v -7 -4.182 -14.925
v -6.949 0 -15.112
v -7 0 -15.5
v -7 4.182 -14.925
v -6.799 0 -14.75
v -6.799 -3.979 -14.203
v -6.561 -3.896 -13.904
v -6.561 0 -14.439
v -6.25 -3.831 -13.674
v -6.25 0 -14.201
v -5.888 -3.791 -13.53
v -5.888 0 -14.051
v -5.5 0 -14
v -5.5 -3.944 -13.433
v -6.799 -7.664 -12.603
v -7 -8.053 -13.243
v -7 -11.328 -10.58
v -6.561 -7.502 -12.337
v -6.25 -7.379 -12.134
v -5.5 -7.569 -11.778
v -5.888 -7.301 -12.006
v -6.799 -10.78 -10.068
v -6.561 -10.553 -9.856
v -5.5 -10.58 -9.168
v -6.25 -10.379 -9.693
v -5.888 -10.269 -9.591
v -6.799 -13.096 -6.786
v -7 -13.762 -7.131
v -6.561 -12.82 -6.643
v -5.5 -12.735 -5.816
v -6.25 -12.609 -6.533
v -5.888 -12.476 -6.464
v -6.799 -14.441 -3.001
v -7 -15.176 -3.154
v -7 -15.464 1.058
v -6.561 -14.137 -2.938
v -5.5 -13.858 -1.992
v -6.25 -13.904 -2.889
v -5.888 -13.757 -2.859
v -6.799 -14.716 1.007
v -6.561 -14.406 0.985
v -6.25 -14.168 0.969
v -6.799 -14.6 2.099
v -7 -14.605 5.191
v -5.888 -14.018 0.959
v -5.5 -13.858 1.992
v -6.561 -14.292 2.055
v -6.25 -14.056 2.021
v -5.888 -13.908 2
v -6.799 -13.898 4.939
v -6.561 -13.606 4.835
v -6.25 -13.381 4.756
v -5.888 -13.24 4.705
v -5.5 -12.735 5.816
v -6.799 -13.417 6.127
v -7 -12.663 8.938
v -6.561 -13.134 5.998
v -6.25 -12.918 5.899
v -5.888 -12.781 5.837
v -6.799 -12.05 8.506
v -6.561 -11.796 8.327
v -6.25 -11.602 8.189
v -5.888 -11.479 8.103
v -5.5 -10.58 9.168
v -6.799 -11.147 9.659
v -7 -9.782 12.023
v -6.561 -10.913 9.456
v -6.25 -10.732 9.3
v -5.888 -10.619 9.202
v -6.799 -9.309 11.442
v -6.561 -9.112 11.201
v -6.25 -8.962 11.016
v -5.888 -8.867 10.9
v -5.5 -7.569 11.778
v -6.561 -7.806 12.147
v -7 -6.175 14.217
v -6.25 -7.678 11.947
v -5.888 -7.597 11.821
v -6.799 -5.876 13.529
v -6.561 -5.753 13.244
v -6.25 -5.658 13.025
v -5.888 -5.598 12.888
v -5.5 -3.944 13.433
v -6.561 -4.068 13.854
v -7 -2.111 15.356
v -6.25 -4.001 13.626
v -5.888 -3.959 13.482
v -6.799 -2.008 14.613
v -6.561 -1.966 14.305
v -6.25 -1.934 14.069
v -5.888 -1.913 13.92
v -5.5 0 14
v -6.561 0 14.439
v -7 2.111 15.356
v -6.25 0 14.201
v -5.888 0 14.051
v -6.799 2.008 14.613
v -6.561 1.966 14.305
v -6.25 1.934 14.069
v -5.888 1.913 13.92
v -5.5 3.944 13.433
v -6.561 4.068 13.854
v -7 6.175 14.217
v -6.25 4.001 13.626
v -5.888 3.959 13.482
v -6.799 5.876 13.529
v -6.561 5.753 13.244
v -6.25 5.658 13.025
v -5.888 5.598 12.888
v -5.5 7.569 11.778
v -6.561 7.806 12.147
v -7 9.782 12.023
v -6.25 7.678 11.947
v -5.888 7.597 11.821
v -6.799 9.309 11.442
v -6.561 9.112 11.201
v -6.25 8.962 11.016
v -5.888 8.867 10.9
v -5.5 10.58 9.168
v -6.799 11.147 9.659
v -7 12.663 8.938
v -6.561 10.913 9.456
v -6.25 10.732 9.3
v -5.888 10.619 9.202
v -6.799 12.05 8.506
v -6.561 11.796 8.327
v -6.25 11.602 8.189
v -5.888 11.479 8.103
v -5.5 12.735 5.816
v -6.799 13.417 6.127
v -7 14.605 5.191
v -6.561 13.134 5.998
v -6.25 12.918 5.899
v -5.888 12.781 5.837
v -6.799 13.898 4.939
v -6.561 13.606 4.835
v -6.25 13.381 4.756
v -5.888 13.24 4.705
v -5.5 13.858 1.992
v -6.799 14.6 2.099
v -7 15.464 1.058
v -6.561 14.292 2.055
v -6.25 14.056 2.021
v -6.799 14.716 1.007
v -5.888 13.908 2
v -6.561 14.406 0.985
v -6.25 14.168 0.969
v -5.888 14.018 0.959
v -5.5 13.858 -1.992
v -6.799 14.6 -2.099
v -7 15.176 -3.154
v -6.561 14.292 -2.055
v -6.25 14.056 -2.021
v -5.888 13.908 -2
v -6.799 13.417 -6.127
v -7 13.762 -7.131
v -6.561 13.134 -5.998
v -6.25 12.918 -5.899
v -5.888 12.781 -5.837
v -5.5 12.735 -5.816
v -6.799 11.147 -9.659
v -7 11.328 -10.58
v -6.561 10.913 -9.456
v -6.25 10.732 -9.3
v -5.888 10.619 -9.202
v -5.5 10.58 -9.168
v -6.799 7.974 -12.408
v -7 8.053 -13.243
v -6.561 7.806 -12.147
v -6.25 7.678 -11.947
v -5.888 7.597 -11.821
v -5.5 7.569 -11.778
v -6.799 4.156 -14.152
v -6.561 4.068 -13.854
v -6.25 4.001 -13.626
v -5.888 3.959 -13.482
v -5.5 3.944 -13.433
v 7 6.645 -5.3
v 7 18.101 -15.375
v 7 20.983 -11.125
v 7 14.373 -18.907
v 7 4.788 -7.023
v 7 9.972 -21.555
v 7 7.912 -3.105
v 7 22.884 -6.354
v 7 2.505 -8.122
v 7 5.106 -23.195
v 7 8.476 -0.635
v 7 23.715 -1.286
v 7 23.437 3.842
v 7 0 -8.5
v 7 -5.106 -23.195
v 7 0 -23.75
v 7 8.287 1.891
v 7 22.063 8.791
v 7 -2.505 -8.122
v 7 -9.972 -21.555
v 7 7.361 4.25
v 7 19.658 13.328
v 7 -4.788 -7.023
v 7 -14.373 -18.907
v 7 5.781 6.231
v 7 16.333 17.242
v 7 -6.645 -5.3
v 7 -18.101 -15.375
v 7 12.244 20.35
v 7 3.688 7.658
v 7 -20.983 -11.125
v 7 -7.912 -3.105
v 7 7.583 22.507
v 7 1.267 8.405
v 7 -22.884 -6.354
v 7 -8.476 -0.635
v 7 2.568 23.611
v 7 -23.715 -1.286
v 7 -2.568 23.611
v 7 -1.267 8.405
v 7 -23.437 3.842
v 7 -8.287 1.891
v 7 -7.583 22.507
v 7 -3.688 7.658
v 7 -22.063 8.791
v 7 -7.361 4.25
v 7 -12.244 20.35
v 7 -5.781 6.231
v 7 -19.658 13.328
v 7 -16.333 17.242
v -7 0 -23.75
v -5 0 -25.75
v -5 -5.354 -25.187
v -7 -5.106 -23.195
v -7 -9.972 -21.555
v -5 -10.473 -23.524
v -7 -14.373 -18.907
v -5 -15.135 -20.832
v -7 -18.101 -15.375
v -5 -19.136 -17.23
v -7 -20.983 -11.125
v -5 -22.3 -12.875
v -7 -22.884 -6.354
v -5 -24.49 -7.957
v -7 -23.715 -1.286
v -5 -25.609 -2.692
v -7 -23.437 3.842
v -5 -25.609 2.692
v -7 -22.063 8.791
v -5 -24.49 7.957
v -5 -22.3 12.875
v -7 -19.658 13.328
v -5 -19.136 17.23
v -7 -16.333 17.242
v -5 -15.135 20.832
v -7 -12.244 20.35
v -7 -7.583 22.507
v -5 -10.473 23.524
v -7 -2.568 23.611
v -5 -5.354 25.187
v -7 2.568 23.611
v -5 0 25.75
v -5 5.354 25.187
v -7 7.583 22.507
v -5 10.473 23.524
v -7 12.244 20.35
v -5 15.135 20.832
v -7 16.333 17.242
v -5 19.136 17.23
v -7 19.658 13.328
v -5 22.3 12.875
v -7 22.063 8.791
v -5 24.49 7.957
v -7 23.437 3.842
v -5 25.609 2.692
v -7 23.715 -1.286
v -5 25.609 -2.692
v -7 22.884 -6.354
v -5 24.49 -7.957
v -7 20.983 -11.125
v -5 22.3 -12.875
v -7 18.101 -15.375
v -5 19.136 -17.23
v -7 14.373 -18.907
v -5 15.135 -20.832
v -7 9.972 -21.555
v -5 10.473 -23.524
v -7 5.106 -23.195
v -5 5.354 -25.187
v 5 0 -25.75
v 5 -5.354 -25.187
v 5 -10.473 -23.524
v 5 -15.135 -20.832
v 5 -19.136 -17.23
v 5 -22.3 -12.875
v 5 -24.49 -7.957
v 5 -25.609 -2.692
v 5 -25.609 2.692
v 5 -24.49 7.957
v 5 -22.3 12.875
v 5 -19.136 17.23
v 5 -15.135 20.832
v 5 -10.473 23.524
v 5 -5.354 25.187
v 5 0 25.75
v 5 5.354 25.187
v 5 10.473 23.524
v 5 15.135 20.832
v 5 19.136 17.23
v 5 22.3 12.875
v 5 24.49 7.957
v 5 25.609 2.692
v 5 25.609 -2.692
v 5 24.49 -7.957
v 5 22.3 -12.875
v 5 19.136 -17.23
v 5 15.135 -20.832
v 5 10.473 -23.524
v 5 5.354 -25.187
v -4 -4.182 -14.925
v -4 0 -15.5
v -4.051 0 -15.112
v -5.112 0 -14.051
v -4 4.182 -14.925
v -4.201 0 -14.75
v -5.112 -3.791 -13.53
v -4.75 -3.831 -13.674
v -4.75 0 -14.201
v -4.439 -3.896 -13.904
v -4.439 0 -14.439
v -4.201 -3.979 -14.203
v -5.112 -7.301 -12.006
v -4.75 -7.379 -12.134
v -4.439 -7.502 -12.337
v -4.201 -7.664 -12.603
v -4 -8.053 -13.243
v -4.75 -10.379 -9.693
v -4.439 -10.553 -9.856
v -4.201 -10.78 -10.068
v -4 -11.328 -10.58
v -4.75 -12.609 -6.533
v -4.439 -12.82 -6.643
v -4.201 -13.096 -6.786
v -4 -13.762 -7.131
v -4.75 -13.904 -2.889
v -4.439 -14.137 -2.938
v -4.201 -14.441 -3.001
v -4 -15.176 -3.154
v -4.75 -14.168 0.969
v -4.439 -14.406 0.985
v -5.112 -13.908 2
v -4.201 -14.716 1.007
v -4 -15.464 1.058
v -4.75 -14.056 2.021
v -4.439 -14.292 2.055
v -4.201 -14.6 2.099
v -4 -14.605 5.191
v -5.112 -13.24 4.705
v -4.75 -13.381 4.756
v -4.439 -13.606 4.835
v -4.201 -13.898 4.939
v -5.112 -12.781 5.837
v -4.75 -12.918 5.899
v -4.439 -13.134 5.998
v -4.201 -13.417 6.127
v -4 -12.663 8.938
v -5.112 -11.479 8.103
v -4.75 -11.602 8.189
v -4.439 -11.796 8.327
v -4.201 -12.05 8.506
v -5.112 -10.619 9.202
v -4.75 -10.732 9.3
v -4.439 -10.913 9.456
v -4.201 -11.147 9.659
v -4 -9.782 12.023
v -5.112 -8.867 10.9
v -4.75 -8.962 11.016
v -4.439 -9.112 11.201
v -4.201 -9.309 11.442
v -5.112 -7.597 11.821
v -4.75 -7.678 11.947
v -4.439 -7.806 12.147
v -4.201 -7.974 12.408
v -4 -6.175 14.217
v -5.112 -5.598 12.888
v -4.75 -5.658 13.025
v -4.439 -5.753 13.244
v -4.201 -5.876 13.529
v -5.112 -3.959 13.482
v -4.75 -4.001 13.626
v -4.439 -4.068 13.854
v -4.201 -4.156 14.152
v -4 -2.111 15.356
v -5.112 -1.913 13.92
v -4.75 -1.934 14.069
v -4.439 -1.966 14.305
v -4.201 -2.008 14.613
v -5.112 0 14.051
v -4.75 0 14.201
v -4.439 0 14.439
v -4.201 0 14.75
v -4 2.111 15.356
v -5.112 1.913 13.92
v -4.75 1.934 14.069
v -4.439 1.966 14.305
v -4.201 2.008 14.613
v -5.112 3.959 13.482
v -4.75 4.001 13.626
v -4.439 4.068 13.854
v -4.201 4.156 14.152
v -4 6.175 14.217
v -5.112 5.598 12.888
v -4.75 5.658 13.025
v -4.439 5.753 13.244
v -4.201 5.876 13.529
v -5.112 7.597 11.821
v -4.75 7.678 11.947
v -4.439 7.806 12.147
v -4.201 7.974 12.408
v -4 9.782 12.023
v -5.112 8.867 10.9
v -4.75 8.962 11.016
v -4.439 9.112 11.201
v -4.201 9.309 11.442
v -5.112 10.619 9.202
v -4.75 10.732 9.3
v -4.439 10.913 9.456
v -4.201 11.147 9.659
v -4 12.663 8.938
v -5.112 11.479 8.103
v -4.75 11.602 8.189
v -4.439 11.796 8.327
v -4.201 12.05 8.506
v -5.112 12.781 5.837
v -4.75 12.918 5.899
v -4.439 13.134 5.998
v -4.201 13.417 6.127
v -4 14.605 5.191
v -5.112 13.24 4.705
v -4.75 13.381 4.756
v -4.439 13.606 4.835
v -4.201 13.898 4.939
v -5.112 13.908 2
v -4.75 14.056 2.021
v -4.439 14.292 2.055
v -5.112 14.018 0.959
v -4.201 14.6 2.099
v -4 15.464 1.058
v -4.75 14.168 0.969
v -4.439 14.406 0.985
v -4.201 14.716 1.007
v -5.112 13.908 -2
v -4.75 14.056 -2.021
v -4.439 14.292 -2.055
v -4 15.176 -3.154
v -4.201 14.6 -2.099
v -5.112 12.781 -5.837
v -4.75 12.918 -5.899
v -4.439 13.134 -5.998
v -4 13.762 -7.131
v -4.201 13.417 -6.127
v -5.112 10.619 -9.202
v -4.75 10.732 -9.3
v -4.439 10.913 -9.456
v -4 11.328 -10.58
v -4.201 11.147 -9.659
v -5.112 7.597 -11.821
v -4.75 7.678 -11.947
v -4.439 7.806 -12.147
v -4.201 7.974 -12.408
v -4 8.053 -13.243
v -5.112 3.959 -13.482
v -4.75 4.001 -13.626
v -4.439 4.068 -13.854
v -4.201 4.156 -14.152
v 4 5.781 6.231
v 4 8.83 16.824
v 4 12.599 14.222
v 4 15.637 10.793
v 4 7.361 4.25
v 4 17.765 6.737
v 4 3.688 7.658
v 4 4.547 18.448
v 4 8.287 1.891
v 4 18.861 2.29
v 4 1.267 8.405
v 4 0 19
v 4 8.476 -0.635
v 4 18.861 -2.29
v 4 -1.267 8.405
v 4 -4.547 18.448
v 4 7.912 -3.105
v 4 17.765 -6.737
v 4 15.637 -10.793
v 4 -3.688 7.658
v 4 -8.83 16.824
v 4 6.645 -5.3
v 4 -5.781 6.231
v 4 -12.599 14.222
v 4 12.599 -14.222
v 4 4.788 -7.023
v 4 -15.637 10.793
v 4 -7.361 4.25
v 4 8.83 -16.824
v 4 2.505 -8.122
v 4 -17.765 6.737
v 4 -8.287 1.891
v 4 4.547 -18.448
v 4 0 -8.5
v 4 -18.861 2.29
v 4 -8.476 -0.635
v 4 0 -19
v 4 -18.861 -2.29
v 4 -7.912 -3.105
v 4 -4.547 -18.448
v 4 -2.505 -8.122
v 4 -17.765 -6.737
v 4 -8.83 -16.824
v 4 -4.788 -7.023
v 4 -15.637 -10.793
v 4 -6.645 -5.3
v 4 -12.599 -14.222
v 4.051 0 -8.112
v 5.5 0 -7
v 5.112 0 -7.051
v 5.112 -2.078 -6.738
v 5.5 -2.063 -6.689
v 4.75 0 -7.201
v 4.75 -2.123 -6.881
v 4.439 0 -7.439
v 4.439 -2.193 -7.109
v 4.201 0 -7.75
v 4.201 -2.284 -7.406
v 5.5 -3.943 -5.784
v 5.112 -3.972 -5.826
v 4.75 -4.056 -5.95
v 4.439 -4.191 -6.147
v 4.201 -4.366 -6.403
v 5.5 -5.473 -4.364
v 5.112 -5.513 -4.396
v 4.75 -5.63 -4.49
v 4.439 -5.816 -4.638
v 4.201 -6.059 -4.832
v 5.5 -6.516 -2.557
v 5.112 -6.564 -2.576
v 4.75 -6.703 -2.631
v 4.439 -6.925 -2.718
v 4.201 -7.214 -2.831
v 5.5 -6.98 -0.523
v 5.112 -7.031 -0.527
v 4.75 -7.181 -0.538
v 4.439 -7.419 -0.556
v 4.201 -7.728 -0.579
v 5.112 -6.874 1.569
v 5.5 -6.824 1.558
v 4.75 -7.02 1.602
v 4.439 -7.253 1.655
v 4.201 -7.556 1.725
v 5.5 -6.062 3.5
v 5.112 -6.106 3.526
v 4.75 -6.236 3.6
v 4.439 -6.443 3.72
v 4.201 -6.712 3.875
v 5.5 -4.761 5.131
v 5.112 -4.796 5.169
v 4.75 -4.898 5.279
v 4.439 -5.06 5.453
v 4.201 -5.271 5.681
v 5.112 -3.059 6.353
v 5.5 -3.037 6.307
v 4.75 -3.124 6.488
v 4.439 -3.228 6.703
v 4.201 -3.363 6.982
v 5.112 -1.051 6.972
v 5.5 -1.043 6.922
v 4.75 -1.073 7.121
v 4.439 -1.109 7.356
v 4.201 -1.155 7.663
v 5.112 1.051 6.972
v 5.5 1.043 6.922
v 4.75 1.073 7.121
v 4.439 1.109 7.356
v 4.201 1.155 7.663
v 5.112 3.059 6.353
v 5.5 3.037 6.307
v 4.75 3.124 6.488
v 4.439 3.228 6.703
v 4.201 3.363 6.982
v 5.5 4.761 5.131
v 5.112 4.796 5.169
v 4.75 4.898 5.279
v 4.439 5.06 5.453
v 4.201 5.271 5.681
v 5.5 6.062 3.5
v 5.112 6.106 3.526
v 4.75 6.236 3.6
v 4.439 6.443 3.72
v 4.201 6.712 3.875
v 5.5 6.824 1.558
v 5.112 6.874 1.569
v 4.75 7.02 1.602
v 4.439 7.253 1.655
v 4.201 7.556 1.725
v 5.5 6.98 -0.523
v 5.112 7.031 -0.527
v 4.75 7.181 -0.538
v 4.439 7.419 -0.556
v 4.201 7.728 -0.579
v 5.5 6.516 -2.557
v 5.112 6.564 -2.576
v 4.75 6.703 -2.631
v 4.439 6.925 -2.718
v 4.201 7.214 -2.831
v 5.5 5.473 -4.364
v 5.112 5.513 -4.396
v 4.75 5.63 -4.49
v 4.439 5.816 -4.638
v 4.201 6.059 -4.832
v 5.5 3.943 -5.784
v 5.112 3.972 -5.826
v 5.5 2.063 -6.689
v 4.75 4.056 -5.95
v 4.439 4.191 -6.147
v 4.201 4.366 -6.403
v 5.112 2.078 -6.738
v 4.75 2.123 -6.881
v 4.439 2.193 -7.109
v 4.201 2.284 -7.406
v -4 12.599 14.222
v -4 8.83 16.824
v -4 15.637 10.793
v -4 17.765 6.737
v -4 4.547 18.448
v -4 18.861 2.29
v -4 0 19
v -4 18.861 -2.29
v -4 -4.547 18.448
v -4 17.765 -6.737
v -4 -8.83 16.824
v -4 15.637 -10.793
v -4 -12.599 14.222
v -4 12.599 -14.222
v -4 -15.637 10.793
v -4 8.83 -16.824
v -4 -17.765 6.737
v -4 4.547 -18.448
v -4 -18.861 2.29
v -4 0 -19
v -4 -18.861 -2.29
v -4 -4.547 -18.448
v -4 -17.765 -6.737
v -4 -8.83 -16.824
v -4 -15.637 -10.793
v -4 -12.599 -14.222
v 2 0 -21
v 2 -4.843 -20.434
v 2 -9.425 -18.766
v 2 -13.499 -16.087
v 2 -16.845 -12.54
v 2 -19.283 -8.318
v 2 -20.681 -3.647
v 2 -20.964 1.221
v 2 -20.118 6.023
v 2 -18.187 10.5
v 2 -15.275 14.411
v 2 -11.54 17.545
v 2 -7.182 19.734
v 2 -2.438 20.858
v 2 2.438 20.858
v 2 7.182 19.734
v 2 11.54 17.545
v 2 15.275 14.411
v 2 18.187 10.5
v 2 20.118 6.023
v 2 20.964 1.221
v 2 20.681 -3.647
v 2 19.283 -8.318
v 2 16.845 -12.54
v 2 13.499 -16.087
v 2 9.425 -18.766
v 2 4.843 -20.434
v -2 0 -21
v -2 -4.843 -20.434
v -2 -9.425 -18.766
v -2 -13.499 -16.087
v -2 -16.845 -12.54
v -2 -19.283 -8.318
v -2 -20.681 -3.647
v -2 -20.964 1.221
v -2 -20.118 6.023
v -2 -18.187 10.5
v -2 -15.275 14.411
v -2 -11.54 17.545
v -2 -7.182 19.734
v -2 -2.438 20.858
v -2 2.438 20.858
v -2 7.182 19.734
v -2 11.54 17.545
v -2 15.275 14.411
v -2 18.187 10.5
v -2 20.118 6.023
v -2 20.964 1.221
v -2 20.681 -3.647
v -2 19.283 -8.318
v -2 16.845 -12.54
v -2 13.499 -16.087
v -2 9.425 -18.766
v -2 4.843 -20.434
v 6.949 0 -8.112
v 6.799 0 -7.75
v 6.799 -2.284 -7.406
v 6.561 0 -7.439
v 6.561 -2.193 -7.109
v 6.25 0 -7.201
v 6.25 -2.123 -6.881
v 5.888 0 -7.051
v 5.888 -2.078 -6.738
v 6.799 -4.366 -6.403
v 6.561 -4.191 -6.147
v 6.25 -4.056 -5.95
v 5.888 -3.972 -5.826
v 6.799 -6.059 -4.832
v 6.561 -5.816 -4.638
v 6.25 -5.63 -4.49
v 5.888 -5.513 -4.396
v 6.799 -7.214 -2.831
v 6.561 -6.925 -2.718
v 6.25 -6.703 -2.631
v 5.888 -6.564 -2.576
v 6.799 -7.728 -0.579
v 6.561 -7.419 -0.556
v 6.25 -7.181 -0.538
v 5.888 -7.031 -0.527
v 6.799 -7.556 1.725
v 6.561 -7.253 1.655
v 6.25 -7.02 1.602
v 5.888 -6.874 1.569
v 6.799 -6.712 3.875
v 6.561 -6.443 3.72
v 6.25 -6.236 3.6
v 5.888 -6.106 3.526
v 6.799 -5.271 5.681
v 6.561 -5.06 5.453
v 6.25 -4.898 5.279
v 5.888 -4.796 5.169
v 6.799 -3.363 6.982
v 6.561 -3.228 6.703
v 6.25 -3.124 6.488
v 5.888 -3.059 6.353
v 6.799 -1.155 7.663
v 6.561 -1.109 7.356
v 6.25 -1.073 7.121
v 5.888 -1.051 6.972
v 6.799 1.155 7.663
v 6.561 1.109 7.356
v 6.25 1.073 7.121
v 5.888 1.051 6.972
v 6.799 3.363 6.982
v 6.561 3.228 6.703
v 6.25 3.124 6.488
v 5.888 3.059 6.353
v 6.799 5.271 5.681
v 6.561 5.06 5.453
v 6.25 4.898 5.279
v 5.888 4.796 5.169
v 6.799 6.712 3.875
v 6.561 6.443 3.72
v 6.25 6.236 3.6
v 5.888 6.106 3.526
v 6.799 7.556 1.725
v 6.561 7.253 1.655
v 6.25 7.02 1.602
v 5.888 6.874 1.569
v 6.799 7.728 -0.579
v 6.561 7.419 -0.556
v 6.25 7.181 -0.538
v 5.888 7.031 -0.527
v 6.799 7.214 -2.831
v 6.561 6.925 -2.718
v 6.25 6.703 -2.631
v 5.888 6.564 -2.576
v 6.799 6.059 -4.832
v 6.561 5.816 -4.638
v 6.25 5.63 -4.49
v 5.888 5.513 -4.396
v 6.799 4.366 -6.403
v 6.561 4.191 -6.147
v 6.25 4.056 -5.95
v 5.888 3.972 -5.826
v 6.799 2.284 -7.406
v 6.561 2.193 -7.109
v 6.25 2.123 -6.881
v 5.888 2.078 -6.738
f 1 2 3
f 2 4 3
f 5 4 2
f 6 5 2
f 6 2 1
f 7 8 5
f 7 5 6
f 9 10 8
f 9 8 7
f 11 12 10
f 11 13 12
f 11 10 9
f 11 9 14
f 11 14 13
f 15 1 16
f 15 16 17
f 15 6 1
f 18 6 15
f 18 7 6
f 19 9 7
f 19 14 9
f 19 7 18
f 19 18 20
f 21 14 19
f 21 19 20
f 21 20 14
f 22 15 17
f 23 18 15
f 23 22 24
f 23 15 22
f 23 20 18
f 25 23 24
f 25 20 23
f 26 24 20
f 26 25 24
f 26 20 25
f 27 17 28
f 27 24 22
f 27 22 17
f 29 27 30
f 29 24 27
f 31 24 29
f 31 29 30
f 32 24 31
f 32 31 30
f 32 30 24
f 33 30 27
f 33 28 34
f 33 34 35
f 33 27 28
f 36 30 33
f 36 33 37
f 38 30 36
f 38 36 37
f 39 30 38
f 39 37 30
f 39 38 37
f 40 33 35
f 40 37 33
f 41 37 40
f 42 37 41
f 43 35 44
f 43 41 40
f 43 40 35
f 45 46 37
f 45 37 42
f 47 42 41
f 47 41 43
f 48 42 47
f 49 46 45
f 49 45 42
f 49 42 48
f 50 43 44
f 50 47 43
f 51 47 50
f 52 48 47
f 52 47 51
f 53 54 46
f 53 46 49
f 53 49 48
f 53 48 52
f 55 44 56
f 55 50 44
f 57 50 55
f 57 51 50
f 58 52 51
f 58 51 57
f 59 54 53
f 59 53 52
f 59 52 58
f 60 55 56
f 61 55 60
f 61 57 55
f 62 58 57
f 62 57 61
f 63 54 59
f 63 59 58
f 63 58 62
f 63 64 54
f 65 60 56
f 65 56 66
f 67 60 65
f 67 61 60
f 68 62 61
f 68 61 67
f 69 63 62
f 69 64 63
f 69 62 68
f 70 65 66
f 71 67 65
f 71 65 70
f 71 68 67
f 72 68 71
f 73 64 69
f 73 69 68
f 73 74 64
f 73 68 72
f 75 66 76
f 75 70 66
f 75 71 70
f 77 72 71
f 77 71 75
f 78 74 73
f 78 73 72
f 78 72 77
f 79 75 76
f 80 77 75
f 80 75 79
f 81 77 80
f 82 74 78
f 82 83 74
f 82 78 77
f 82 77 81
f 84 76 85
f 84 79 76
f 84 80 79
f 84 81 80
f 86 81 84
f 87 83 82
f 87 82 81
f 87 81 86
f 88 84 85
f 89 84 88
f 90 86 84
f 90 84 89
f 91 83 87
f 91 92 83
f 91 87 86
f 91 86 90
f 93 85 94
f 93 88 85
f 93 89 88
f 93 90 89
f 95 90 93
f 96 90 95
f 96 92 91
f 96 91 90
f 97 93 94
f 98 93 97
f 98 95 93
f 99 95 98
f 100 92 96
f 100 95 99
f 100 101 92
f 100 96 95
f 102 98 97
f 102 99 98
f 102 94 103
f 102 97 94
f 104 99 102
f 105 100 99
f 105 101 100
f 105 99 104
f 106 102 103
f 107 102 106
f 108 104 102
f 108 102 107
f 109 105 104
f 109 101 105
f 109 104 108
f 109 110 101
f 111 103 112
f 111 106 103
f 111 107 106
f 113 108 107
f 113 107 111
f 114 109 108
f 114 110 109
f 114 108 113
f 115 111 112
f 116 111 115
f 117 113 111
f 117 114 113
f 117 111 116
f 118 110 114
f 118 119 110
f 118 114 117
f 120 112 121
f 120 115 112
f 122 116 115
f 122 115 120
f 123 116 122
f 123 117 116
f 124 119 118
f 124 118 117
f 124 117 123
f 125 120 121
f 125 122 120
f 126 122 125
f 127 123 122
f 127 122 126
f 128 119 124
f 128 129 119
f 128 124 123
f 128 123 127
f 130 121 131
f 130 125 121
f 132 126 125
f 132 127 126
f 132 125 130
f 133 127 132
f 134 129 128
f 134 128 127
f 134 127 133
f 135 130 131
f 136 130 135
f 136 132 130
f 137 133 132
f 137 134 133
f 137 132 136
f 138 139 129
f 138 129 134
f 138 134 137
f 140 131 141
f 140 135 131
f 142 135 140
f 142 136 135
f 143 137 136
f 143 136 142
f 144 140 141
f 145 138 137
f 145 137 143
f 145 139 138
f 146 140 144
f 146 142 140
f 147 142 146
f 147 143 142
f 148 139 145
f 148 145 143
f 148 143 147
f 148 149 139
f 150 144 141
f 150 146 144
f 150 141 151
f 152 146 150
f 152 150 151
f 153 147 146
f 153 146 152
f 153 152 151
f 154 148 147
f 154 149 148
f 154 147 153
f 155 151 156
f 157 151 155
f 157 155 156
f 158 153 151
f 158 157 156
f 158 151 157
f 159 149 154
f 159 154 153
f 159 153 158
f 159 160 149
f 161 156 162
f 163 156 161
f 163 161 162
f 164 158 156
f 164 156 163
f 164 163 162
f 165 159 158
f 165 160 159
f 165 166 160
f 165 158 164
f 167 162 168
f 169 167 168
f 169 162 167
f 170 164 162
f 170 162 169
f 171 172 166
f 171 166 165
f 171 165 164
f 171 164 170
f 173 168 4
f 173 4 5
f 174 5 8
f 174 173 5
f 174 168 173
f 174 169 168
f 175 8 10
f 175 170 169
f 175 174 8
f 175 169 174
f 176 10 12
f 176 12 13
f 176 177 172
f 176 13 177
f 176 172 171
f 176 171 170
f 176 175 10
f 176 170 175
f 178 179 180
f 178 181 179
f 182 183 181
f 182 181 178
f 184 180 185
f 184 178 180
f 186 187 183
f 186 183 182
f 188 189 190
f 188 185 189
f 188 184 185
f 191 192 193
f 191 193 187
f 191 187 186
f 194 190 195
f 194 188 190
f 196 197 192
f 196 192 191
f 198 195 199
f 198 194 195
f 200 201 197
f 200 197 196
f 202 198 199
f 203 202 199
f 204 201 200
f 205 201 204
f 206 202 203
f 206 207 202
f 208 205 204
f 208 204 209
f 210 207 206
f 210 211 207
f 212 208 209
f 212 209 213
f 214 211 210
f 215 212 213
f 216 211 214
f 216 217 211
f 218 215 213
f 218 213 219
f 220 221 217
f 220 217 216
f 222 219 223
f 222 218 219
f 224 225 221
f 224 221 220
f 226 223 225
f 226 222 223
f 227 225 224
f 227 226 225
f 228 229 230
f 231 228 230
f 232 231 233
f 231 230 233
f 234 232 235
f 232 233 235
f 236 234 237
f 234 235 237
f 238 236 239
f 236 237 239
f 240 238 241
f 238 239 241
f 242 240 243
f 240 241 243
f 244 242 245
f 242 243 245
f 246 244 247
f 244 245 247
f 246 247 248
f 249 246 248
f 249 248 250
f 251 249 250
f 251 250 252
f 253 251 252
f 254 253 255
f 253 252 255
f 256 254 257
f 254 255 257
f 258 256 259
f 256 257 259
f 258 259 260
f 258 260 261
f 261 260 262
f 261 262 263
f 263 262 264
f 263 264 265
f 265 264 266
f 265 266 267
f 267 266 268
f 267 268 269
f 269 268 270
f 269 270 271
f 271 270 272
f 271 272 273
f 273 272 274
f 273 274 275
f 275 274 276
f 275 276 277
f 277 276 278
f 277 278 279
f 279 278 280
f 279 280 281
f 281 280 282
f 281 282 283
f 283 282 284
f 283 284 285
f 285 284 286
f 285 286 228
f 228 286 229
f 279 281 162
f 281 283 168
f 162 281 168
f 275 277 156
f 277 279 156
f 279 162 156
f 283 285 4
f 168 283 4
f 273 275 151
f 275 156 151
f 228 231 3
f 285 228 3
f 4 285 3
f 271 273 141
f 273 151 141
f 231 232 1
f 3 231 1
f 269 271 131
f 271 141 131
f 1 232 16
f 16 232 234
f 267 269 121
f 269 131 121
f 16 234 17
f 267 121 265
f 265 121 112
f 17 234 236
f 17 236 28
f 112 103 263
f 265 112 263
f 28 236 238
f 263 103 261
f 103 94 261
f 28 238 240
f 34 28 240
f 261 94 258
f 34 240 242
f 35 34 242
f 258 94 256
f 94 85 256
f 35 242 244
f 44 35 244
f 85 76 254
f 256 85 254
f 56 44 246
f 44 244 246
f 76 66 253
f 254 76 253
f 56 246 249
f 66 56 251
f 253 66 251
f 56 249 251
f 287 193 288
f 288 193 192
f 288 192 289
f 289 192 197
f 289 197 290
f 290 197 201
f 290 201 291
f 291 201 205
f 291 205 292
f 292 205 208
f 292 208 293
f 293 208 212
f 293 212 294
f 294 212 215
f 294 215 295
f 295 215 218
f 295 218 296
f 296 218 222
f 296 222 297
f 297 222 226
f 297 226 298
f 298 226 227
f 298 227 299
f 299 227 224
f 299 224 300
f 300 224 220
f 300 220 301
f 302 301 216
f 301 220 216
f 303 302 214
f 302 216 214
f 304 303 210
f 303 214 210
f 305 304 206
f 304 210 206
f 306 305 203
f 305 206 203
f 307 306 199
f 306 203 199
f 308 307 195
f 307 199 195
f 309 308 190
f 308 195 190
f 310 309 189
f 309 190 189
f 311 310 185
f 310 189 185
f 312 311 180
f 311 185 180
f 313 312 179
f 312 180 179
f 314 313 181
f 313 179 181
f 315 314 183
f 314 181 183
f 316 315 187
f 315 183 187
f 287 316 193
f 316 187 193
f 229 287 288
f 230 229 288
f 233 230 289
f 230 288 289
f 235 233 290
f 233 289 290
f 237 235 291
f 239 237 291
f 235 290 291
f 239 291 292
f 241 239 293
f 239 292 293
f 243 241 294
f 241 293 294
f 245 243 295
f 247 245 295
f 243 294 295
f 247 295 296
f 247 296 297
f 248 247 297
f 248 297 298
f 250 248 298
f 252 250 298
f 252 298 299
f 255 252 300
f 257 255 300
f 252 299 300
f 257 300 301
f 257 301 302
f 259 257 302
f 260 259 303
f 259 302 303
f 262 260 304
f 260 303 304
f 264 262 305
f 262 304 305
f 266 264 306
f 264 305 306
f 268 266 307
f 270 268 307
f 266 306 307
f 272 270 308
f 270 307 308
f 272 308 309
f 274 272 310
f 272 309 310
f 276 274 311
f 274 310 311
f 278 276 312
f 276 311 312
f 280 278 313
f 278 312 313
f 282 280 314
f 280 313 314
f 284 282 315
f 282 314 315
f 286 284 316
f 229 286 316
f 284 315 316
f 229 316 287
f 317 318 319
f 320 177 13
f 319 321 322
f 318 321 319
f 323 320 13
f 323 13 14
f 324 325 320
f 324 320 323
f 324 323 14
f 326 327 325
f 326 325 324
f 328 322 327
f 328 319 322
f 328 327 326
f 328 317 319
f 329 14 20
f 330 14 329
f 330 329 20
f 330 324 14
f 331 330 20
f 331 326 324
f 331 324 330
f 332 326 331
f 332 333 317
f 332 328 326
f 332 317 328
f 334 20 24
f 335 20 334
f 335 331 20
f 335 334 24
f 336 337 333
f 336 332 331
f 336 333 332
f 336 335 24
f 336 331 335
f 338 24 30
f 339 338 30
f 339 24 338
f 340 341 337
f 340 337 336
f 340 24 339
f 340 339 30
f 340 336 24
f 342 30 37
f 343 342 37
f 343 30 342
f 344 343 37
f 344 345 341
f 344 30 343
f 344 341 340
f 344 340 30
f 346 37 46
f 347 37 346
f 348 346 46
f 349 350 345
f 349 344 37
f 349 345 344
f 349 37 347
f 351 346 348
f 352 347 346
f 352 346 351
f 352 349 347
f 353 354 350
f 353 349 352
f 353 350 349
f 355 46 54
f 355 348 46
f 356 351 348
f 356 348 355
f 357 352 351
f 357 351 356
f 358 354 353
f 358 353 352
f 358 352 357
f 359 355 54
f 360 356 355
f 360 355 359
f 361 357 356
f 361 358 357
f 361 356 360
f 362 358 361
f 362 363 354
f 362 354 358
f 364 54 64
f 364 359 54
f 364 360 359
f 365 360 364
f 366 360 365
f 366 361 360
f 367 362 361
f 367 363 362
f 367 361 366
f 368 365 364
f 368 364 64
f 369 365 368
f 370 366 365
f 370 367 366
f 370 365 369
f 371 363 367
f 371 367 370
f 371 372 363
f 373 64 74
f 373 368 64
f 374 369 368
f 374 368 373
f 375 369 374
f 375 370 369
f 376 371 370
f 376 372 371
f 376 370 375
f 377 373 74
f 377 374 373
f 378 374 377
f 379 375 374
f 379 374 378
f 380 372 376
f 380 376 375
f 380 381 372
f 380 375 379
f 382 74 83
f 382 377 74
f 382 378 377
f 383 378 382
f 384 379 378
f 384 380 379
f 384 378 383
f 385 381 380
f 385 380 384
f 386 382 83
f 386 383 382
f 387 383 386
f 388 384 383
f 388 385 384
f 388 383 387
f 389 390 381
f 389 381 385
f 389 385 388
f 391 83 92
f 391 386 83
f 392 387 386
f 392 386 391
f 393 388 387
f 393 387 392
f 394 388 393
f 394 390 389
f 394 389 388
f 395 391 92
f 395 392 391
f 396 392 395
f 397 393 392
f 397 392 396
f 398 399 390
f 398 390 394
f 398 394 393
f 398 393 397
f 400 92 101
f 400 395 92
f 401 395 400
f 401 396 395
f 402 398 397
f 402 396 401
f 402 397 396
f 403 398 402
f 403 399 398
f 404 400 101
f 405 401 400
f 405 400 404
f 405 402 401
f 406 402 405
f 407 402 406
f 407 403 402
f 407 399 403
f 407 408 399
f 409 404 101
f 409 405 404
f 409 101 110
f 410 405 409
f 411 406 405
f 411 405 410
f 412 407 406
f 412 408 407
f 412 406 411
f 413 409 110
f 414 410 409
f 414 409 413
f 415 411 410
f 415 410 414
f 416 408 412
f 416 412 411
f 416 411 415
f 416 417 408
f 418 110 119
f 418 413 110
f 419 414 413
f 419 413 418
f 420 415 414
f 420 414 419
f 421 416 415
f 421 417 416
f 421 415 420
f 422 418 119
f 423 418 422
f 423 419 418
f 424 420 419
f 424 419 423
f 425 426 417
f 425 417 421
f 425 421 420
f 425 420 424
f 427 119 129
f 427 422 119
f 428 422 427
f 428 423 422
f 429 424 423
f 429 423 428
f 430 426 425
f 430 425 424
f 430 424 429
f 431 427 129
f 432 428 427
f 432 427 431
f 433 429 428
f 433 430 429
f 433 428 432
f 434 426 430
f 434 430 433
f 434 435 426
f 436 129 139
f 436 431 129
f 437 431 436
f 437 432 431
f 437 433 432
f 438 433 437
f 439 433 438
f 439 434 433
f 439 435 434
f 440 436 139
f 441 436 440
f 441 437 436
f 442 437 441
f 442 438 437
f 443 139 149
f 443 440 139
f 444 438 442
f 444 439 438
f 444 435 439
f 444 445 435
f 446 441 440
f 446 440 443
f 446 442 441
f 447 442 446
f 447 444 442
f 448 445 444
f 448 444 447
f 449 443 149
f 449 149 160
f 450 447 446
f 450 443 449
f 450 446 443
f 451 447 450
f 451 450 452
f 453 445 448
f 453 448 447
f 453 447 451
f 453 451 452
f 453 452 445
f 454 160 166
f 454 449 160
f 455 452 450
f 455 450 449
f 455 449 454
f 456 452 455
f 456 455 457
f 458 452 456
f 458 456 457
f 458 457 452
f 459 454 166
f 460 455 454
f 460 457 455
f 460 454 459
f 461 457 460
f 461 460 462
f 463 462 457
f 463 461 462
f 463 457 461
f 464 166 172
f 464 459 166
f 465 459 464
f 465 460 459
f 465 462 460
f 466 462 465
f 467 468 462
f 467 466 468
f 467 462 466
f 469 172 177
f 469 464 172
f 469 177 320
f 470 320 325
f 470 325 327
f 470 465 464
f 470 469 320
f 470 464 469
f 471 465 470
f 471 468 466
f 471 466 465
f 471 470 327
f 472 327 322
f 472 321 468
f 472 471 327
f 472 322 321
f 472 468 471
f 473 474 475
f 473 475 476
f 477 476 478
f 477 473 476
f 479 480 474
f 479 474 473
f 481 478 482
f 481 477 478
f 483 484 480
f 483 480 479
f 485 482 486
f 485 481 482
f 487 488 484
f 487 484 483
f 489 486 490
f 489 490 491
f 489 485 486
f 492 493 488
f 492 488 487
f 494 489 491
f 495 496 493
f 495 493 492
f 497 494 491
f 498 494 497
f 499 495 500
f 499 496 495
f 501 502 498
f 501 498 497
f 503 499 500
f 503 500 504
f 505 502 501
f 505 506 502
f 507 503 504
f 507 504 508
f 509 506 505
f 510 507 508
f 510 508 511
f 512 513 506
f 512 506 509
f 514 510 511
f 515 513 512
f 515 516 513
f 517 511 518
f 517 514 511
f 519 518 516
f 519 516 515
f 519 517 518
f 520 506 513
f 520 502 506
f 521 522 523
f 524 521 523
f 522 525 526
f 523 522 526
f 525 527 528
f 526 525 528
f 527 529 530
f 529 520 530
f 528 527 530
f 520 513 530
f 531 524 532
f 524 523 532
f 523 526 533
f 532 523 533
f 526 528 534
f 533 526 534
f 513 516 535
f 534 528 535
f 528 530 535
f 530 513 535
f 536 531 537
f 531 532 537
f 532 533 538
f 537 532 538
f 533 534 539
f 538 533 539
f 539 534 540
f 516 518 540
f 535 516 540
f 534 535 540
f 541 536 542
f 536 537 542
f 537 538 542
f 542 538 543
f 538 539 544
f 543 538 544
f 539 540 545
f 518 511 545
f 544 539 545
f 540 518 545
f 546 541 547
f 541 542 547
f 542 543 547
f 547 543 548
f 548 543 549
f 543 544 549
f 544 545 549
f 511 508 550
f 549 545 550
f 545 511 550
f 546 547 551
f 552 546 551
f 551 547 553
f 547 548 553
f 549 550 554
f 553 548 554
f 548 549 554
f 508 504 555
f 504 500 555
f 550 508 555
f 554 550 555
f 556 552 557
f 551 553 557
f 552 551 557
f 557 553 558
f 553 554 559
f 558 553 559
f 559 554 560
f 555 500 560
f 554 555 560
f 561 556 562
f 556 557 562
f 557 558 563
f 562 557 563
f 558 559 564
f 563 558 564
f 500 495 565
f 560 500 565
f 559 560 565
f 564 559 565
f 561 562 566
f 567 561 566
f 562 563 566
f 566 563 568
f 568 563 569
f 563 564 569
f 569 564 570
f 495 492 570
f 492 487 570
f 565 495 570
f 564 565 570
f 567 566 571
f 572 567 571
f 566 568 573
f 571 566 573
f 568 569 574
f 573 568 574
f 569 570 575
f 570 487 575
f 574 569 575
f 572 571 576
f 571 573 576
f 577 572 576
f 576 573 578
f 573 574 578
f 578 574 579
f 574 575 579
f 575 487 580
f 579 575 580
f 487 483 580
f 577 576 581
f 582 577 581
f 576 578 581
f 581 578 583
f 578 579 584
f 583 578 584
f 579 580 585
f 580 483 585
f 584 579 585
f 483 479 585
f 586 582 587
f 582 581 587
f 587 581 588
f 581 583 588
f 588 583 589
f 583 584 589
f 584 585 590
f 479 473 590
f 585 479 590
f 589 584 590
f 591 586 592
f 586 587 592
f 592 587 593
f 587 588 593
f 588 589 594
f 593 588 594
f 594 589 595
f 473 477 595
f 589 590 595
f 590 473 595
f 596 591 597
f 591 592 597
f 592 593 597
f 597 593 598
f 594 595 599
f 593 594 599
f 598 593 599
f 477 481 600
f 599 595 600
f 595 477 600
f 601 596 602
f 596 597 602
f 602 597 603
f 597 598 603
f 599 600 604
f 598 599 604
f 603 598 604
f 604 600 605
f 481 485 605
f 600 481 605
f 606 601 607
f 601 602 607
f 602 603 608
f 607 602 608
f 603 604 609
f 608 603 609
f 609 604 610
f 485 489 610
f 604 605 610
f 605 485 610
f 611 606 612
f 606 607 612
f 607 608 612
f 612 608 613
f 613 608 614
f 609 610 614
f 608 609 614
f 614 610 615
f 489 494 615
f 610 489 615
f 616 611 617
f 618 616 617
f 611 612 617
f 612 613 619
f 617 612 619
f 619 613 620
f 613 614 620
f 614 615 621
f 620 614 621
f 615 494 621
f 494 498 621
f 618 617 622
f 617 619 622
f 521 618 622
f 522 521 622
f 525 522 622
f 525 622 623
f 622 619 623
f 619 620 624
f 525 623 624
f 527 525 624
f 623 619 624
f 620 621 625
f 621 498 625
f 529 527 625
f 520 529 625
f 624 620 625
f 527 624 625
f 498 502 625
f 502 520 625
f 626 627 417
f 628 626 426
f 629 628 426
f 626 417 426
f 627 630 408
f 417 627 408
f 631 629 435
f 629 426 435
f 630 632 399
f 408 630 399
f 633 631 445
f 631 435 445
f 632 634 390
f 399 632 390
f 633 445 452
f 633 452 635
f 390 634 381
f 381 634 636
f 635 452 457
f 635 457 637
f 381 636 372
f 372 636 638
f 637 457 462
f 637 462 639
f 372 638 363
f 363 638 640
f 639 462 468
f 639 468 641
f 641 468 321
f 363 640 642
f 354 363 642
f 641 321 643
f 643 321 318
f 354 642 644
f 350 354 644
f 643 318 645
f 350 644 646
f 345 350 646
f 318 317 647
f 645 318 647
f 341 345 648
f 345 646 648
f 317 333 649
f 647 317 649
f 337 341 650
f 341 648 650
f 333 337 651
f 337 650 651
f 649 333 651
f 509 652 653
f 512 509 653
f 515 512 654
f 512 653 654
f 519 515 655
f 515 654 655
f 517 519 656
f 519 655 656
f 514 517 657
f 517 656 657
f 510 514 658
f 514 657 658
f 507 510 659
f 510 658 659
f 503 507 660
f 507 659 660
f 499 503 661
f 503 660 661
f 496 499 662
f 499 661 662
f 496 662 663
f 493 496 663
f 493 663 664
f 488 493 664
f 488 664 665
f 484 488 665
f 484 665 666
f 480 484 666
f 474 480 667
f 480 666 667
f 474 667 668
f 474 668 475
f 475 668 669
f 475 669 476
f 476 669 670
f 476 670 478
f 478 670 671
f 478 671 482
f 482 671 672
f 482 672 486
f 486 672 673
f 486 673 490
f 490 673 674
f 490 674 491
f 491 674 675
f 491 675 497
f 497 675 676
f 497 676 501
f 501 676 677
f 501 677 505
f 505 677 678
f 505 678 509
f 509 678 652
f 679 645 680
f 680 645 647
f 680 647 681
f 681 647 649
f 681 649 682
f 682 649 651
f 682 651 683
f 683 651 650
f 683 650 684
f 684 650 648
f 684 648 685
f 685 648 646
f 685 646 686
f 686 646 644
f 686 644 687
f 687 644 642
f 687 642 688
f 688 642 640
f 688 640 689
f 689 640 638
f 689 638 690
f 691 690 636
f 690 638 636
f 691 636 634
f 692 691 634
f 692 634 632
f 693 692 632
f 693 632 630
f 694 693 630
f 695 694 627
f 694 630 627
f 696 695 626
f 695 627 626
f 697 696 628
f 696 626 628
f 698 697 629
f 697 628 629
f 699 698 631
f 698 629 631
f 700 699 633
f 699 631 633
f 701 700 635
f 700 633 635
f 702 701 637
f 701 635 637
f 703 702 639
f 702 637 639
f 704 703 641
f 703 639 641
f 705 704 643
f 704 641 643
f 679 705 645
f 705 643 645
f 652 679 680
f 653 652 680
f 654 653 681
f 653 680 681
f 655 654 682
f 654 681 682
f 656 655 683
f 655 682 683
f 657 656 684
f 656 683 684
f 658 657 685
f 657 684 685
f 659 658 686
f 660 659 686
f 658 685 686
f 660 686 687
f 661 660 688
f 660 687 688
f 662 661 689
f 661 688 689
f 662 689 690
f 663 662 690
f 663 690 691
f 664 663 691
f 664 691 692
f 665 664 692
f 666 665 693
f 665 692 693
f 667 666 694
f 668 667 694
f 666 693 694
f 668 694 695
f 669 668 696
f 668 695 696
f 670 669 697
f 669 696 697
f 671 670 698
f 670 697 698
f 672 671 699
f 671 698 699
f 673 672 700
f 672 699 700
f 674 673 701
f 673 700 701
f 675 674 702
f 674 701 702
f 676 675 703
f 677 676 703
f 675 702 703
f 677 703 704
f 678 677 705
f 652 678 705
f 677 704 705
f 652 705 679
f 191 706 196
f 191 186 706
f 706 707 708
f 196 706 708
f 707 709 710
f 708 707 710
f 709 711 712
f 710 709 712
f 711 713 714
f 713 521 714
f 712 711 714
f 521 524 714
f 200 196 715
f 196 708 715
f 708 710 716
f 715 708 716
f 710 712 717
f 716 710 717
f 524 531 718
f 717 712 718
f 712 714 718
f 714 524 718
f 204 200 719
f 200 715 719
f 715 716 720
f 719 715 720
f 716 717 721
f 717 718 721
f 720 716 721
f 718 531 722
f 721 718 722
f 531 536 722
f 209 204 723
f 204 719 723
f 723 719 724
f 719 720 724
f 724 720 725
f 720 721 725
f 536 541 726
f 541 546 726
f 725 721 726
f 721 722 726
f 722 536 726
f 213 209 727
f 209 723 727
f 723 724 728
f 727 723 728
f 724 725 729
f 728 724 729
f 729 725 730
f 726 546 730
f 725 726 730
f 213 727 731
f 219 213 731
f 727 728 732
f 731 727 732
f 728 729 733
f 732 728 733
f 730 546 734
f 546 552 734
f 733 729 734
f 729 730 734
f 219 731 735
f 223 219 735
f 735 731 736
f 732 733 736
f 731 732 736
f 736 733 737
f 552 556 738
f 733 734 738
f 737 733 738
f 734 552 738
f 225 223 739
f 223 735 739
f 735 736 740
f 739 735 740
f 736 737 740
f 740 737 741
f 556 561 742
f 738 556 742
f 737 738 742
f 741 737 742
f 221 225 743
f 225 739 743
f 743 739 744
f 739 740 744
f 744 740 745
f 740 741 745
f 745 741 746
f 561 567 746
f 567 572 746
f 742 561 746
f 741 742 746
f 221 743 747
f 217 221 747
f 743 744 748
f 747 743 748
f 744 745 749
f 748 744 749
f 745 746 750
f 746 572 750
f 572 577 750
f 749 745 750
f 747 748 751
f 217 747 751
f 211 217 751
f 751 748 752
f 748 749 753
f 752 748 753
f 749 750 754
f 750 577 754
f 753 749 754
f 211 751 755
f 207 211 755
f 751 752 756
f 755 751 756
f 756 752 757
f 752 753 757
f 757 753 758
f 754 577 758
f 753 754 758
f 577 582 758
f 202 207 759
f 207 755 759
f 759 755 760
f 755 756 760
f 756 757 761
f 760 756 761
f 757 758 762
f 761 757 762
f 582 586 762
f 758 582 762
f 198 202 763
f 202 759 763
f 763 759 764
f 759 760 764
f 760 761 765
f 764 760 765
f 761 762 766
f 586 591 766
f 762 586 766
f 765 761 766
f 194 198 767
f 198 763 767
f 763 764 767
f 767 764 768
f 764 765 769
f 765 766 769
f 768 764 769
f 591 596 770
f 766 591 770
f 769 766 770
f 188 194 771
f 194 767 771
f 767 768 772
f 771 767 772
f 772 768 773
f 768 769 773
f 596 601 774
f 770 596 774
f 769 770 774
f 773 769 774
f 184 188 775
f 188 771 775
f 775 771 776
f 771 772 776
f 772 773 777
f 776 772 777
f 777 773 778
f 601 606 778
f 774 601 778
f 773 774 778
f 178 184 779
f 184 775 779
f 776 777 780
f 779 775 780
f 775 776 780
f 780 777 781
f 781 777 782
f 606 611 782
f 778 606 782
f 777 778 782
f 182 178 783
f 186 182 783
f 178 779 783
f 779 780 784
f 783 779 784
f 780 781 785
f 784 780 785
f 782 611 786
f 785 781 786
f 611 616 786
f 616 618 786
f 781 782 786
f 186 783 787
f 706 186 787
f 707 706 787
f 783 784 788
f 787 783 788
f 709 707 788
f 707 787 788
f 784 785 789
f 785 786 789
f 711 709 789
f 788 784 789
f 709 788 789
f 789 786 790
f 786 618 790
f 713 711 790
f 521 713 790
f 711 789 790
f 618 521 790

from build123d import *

# Parameters (mm, degrees)
CHAMFER1_SIZE = 2
FILLET1_R     = 1.5


with BuildPart() as part:
    # Sketch1 → Revolve1 (revolve)
    with BuildSketch(Plane.XY, mode=Mode.PRIVATE) as revolve1_sk:
        Polygon((-7, 14), (-7, 25.75), (7, 25.75), (7, 14), (7, 7), (4, 7), (4, 14), (4, 21), (-4, 21), (-4, 14), align=None)
    revolve(revolve1_sk.sketch.rotate(Axis((0, 0, 0), (-1, 0, 0)), 90), axis=Axis((0, 0, 0), (-1, 0, 0)))

    # Chamfer1
    chamfer1_edges = [part.edges().sort_by_distance(p)[0] for p in [
        (7, 0, 25.75),
        (-7, 0, 25.75),
        (-4, 0, 21),
        (4, 0, 21),
    ]]
    chamfer(chamfer1_edges, length=CHAMFER1_SIZE)

    # Fillet1
    fillet1_edges = [part.edges().sort_by_distance(p)[0] for p in [
        (7, 0, 7),
        (-7, 0, 14),
        (-4, 0, 14),
        (4, 0, 7),
    ]]
    fillet(fillet1_edges, radius=FILLET1_R - 0.0001)  # a hair under: the kernel refuses the full size


solid = part.part
